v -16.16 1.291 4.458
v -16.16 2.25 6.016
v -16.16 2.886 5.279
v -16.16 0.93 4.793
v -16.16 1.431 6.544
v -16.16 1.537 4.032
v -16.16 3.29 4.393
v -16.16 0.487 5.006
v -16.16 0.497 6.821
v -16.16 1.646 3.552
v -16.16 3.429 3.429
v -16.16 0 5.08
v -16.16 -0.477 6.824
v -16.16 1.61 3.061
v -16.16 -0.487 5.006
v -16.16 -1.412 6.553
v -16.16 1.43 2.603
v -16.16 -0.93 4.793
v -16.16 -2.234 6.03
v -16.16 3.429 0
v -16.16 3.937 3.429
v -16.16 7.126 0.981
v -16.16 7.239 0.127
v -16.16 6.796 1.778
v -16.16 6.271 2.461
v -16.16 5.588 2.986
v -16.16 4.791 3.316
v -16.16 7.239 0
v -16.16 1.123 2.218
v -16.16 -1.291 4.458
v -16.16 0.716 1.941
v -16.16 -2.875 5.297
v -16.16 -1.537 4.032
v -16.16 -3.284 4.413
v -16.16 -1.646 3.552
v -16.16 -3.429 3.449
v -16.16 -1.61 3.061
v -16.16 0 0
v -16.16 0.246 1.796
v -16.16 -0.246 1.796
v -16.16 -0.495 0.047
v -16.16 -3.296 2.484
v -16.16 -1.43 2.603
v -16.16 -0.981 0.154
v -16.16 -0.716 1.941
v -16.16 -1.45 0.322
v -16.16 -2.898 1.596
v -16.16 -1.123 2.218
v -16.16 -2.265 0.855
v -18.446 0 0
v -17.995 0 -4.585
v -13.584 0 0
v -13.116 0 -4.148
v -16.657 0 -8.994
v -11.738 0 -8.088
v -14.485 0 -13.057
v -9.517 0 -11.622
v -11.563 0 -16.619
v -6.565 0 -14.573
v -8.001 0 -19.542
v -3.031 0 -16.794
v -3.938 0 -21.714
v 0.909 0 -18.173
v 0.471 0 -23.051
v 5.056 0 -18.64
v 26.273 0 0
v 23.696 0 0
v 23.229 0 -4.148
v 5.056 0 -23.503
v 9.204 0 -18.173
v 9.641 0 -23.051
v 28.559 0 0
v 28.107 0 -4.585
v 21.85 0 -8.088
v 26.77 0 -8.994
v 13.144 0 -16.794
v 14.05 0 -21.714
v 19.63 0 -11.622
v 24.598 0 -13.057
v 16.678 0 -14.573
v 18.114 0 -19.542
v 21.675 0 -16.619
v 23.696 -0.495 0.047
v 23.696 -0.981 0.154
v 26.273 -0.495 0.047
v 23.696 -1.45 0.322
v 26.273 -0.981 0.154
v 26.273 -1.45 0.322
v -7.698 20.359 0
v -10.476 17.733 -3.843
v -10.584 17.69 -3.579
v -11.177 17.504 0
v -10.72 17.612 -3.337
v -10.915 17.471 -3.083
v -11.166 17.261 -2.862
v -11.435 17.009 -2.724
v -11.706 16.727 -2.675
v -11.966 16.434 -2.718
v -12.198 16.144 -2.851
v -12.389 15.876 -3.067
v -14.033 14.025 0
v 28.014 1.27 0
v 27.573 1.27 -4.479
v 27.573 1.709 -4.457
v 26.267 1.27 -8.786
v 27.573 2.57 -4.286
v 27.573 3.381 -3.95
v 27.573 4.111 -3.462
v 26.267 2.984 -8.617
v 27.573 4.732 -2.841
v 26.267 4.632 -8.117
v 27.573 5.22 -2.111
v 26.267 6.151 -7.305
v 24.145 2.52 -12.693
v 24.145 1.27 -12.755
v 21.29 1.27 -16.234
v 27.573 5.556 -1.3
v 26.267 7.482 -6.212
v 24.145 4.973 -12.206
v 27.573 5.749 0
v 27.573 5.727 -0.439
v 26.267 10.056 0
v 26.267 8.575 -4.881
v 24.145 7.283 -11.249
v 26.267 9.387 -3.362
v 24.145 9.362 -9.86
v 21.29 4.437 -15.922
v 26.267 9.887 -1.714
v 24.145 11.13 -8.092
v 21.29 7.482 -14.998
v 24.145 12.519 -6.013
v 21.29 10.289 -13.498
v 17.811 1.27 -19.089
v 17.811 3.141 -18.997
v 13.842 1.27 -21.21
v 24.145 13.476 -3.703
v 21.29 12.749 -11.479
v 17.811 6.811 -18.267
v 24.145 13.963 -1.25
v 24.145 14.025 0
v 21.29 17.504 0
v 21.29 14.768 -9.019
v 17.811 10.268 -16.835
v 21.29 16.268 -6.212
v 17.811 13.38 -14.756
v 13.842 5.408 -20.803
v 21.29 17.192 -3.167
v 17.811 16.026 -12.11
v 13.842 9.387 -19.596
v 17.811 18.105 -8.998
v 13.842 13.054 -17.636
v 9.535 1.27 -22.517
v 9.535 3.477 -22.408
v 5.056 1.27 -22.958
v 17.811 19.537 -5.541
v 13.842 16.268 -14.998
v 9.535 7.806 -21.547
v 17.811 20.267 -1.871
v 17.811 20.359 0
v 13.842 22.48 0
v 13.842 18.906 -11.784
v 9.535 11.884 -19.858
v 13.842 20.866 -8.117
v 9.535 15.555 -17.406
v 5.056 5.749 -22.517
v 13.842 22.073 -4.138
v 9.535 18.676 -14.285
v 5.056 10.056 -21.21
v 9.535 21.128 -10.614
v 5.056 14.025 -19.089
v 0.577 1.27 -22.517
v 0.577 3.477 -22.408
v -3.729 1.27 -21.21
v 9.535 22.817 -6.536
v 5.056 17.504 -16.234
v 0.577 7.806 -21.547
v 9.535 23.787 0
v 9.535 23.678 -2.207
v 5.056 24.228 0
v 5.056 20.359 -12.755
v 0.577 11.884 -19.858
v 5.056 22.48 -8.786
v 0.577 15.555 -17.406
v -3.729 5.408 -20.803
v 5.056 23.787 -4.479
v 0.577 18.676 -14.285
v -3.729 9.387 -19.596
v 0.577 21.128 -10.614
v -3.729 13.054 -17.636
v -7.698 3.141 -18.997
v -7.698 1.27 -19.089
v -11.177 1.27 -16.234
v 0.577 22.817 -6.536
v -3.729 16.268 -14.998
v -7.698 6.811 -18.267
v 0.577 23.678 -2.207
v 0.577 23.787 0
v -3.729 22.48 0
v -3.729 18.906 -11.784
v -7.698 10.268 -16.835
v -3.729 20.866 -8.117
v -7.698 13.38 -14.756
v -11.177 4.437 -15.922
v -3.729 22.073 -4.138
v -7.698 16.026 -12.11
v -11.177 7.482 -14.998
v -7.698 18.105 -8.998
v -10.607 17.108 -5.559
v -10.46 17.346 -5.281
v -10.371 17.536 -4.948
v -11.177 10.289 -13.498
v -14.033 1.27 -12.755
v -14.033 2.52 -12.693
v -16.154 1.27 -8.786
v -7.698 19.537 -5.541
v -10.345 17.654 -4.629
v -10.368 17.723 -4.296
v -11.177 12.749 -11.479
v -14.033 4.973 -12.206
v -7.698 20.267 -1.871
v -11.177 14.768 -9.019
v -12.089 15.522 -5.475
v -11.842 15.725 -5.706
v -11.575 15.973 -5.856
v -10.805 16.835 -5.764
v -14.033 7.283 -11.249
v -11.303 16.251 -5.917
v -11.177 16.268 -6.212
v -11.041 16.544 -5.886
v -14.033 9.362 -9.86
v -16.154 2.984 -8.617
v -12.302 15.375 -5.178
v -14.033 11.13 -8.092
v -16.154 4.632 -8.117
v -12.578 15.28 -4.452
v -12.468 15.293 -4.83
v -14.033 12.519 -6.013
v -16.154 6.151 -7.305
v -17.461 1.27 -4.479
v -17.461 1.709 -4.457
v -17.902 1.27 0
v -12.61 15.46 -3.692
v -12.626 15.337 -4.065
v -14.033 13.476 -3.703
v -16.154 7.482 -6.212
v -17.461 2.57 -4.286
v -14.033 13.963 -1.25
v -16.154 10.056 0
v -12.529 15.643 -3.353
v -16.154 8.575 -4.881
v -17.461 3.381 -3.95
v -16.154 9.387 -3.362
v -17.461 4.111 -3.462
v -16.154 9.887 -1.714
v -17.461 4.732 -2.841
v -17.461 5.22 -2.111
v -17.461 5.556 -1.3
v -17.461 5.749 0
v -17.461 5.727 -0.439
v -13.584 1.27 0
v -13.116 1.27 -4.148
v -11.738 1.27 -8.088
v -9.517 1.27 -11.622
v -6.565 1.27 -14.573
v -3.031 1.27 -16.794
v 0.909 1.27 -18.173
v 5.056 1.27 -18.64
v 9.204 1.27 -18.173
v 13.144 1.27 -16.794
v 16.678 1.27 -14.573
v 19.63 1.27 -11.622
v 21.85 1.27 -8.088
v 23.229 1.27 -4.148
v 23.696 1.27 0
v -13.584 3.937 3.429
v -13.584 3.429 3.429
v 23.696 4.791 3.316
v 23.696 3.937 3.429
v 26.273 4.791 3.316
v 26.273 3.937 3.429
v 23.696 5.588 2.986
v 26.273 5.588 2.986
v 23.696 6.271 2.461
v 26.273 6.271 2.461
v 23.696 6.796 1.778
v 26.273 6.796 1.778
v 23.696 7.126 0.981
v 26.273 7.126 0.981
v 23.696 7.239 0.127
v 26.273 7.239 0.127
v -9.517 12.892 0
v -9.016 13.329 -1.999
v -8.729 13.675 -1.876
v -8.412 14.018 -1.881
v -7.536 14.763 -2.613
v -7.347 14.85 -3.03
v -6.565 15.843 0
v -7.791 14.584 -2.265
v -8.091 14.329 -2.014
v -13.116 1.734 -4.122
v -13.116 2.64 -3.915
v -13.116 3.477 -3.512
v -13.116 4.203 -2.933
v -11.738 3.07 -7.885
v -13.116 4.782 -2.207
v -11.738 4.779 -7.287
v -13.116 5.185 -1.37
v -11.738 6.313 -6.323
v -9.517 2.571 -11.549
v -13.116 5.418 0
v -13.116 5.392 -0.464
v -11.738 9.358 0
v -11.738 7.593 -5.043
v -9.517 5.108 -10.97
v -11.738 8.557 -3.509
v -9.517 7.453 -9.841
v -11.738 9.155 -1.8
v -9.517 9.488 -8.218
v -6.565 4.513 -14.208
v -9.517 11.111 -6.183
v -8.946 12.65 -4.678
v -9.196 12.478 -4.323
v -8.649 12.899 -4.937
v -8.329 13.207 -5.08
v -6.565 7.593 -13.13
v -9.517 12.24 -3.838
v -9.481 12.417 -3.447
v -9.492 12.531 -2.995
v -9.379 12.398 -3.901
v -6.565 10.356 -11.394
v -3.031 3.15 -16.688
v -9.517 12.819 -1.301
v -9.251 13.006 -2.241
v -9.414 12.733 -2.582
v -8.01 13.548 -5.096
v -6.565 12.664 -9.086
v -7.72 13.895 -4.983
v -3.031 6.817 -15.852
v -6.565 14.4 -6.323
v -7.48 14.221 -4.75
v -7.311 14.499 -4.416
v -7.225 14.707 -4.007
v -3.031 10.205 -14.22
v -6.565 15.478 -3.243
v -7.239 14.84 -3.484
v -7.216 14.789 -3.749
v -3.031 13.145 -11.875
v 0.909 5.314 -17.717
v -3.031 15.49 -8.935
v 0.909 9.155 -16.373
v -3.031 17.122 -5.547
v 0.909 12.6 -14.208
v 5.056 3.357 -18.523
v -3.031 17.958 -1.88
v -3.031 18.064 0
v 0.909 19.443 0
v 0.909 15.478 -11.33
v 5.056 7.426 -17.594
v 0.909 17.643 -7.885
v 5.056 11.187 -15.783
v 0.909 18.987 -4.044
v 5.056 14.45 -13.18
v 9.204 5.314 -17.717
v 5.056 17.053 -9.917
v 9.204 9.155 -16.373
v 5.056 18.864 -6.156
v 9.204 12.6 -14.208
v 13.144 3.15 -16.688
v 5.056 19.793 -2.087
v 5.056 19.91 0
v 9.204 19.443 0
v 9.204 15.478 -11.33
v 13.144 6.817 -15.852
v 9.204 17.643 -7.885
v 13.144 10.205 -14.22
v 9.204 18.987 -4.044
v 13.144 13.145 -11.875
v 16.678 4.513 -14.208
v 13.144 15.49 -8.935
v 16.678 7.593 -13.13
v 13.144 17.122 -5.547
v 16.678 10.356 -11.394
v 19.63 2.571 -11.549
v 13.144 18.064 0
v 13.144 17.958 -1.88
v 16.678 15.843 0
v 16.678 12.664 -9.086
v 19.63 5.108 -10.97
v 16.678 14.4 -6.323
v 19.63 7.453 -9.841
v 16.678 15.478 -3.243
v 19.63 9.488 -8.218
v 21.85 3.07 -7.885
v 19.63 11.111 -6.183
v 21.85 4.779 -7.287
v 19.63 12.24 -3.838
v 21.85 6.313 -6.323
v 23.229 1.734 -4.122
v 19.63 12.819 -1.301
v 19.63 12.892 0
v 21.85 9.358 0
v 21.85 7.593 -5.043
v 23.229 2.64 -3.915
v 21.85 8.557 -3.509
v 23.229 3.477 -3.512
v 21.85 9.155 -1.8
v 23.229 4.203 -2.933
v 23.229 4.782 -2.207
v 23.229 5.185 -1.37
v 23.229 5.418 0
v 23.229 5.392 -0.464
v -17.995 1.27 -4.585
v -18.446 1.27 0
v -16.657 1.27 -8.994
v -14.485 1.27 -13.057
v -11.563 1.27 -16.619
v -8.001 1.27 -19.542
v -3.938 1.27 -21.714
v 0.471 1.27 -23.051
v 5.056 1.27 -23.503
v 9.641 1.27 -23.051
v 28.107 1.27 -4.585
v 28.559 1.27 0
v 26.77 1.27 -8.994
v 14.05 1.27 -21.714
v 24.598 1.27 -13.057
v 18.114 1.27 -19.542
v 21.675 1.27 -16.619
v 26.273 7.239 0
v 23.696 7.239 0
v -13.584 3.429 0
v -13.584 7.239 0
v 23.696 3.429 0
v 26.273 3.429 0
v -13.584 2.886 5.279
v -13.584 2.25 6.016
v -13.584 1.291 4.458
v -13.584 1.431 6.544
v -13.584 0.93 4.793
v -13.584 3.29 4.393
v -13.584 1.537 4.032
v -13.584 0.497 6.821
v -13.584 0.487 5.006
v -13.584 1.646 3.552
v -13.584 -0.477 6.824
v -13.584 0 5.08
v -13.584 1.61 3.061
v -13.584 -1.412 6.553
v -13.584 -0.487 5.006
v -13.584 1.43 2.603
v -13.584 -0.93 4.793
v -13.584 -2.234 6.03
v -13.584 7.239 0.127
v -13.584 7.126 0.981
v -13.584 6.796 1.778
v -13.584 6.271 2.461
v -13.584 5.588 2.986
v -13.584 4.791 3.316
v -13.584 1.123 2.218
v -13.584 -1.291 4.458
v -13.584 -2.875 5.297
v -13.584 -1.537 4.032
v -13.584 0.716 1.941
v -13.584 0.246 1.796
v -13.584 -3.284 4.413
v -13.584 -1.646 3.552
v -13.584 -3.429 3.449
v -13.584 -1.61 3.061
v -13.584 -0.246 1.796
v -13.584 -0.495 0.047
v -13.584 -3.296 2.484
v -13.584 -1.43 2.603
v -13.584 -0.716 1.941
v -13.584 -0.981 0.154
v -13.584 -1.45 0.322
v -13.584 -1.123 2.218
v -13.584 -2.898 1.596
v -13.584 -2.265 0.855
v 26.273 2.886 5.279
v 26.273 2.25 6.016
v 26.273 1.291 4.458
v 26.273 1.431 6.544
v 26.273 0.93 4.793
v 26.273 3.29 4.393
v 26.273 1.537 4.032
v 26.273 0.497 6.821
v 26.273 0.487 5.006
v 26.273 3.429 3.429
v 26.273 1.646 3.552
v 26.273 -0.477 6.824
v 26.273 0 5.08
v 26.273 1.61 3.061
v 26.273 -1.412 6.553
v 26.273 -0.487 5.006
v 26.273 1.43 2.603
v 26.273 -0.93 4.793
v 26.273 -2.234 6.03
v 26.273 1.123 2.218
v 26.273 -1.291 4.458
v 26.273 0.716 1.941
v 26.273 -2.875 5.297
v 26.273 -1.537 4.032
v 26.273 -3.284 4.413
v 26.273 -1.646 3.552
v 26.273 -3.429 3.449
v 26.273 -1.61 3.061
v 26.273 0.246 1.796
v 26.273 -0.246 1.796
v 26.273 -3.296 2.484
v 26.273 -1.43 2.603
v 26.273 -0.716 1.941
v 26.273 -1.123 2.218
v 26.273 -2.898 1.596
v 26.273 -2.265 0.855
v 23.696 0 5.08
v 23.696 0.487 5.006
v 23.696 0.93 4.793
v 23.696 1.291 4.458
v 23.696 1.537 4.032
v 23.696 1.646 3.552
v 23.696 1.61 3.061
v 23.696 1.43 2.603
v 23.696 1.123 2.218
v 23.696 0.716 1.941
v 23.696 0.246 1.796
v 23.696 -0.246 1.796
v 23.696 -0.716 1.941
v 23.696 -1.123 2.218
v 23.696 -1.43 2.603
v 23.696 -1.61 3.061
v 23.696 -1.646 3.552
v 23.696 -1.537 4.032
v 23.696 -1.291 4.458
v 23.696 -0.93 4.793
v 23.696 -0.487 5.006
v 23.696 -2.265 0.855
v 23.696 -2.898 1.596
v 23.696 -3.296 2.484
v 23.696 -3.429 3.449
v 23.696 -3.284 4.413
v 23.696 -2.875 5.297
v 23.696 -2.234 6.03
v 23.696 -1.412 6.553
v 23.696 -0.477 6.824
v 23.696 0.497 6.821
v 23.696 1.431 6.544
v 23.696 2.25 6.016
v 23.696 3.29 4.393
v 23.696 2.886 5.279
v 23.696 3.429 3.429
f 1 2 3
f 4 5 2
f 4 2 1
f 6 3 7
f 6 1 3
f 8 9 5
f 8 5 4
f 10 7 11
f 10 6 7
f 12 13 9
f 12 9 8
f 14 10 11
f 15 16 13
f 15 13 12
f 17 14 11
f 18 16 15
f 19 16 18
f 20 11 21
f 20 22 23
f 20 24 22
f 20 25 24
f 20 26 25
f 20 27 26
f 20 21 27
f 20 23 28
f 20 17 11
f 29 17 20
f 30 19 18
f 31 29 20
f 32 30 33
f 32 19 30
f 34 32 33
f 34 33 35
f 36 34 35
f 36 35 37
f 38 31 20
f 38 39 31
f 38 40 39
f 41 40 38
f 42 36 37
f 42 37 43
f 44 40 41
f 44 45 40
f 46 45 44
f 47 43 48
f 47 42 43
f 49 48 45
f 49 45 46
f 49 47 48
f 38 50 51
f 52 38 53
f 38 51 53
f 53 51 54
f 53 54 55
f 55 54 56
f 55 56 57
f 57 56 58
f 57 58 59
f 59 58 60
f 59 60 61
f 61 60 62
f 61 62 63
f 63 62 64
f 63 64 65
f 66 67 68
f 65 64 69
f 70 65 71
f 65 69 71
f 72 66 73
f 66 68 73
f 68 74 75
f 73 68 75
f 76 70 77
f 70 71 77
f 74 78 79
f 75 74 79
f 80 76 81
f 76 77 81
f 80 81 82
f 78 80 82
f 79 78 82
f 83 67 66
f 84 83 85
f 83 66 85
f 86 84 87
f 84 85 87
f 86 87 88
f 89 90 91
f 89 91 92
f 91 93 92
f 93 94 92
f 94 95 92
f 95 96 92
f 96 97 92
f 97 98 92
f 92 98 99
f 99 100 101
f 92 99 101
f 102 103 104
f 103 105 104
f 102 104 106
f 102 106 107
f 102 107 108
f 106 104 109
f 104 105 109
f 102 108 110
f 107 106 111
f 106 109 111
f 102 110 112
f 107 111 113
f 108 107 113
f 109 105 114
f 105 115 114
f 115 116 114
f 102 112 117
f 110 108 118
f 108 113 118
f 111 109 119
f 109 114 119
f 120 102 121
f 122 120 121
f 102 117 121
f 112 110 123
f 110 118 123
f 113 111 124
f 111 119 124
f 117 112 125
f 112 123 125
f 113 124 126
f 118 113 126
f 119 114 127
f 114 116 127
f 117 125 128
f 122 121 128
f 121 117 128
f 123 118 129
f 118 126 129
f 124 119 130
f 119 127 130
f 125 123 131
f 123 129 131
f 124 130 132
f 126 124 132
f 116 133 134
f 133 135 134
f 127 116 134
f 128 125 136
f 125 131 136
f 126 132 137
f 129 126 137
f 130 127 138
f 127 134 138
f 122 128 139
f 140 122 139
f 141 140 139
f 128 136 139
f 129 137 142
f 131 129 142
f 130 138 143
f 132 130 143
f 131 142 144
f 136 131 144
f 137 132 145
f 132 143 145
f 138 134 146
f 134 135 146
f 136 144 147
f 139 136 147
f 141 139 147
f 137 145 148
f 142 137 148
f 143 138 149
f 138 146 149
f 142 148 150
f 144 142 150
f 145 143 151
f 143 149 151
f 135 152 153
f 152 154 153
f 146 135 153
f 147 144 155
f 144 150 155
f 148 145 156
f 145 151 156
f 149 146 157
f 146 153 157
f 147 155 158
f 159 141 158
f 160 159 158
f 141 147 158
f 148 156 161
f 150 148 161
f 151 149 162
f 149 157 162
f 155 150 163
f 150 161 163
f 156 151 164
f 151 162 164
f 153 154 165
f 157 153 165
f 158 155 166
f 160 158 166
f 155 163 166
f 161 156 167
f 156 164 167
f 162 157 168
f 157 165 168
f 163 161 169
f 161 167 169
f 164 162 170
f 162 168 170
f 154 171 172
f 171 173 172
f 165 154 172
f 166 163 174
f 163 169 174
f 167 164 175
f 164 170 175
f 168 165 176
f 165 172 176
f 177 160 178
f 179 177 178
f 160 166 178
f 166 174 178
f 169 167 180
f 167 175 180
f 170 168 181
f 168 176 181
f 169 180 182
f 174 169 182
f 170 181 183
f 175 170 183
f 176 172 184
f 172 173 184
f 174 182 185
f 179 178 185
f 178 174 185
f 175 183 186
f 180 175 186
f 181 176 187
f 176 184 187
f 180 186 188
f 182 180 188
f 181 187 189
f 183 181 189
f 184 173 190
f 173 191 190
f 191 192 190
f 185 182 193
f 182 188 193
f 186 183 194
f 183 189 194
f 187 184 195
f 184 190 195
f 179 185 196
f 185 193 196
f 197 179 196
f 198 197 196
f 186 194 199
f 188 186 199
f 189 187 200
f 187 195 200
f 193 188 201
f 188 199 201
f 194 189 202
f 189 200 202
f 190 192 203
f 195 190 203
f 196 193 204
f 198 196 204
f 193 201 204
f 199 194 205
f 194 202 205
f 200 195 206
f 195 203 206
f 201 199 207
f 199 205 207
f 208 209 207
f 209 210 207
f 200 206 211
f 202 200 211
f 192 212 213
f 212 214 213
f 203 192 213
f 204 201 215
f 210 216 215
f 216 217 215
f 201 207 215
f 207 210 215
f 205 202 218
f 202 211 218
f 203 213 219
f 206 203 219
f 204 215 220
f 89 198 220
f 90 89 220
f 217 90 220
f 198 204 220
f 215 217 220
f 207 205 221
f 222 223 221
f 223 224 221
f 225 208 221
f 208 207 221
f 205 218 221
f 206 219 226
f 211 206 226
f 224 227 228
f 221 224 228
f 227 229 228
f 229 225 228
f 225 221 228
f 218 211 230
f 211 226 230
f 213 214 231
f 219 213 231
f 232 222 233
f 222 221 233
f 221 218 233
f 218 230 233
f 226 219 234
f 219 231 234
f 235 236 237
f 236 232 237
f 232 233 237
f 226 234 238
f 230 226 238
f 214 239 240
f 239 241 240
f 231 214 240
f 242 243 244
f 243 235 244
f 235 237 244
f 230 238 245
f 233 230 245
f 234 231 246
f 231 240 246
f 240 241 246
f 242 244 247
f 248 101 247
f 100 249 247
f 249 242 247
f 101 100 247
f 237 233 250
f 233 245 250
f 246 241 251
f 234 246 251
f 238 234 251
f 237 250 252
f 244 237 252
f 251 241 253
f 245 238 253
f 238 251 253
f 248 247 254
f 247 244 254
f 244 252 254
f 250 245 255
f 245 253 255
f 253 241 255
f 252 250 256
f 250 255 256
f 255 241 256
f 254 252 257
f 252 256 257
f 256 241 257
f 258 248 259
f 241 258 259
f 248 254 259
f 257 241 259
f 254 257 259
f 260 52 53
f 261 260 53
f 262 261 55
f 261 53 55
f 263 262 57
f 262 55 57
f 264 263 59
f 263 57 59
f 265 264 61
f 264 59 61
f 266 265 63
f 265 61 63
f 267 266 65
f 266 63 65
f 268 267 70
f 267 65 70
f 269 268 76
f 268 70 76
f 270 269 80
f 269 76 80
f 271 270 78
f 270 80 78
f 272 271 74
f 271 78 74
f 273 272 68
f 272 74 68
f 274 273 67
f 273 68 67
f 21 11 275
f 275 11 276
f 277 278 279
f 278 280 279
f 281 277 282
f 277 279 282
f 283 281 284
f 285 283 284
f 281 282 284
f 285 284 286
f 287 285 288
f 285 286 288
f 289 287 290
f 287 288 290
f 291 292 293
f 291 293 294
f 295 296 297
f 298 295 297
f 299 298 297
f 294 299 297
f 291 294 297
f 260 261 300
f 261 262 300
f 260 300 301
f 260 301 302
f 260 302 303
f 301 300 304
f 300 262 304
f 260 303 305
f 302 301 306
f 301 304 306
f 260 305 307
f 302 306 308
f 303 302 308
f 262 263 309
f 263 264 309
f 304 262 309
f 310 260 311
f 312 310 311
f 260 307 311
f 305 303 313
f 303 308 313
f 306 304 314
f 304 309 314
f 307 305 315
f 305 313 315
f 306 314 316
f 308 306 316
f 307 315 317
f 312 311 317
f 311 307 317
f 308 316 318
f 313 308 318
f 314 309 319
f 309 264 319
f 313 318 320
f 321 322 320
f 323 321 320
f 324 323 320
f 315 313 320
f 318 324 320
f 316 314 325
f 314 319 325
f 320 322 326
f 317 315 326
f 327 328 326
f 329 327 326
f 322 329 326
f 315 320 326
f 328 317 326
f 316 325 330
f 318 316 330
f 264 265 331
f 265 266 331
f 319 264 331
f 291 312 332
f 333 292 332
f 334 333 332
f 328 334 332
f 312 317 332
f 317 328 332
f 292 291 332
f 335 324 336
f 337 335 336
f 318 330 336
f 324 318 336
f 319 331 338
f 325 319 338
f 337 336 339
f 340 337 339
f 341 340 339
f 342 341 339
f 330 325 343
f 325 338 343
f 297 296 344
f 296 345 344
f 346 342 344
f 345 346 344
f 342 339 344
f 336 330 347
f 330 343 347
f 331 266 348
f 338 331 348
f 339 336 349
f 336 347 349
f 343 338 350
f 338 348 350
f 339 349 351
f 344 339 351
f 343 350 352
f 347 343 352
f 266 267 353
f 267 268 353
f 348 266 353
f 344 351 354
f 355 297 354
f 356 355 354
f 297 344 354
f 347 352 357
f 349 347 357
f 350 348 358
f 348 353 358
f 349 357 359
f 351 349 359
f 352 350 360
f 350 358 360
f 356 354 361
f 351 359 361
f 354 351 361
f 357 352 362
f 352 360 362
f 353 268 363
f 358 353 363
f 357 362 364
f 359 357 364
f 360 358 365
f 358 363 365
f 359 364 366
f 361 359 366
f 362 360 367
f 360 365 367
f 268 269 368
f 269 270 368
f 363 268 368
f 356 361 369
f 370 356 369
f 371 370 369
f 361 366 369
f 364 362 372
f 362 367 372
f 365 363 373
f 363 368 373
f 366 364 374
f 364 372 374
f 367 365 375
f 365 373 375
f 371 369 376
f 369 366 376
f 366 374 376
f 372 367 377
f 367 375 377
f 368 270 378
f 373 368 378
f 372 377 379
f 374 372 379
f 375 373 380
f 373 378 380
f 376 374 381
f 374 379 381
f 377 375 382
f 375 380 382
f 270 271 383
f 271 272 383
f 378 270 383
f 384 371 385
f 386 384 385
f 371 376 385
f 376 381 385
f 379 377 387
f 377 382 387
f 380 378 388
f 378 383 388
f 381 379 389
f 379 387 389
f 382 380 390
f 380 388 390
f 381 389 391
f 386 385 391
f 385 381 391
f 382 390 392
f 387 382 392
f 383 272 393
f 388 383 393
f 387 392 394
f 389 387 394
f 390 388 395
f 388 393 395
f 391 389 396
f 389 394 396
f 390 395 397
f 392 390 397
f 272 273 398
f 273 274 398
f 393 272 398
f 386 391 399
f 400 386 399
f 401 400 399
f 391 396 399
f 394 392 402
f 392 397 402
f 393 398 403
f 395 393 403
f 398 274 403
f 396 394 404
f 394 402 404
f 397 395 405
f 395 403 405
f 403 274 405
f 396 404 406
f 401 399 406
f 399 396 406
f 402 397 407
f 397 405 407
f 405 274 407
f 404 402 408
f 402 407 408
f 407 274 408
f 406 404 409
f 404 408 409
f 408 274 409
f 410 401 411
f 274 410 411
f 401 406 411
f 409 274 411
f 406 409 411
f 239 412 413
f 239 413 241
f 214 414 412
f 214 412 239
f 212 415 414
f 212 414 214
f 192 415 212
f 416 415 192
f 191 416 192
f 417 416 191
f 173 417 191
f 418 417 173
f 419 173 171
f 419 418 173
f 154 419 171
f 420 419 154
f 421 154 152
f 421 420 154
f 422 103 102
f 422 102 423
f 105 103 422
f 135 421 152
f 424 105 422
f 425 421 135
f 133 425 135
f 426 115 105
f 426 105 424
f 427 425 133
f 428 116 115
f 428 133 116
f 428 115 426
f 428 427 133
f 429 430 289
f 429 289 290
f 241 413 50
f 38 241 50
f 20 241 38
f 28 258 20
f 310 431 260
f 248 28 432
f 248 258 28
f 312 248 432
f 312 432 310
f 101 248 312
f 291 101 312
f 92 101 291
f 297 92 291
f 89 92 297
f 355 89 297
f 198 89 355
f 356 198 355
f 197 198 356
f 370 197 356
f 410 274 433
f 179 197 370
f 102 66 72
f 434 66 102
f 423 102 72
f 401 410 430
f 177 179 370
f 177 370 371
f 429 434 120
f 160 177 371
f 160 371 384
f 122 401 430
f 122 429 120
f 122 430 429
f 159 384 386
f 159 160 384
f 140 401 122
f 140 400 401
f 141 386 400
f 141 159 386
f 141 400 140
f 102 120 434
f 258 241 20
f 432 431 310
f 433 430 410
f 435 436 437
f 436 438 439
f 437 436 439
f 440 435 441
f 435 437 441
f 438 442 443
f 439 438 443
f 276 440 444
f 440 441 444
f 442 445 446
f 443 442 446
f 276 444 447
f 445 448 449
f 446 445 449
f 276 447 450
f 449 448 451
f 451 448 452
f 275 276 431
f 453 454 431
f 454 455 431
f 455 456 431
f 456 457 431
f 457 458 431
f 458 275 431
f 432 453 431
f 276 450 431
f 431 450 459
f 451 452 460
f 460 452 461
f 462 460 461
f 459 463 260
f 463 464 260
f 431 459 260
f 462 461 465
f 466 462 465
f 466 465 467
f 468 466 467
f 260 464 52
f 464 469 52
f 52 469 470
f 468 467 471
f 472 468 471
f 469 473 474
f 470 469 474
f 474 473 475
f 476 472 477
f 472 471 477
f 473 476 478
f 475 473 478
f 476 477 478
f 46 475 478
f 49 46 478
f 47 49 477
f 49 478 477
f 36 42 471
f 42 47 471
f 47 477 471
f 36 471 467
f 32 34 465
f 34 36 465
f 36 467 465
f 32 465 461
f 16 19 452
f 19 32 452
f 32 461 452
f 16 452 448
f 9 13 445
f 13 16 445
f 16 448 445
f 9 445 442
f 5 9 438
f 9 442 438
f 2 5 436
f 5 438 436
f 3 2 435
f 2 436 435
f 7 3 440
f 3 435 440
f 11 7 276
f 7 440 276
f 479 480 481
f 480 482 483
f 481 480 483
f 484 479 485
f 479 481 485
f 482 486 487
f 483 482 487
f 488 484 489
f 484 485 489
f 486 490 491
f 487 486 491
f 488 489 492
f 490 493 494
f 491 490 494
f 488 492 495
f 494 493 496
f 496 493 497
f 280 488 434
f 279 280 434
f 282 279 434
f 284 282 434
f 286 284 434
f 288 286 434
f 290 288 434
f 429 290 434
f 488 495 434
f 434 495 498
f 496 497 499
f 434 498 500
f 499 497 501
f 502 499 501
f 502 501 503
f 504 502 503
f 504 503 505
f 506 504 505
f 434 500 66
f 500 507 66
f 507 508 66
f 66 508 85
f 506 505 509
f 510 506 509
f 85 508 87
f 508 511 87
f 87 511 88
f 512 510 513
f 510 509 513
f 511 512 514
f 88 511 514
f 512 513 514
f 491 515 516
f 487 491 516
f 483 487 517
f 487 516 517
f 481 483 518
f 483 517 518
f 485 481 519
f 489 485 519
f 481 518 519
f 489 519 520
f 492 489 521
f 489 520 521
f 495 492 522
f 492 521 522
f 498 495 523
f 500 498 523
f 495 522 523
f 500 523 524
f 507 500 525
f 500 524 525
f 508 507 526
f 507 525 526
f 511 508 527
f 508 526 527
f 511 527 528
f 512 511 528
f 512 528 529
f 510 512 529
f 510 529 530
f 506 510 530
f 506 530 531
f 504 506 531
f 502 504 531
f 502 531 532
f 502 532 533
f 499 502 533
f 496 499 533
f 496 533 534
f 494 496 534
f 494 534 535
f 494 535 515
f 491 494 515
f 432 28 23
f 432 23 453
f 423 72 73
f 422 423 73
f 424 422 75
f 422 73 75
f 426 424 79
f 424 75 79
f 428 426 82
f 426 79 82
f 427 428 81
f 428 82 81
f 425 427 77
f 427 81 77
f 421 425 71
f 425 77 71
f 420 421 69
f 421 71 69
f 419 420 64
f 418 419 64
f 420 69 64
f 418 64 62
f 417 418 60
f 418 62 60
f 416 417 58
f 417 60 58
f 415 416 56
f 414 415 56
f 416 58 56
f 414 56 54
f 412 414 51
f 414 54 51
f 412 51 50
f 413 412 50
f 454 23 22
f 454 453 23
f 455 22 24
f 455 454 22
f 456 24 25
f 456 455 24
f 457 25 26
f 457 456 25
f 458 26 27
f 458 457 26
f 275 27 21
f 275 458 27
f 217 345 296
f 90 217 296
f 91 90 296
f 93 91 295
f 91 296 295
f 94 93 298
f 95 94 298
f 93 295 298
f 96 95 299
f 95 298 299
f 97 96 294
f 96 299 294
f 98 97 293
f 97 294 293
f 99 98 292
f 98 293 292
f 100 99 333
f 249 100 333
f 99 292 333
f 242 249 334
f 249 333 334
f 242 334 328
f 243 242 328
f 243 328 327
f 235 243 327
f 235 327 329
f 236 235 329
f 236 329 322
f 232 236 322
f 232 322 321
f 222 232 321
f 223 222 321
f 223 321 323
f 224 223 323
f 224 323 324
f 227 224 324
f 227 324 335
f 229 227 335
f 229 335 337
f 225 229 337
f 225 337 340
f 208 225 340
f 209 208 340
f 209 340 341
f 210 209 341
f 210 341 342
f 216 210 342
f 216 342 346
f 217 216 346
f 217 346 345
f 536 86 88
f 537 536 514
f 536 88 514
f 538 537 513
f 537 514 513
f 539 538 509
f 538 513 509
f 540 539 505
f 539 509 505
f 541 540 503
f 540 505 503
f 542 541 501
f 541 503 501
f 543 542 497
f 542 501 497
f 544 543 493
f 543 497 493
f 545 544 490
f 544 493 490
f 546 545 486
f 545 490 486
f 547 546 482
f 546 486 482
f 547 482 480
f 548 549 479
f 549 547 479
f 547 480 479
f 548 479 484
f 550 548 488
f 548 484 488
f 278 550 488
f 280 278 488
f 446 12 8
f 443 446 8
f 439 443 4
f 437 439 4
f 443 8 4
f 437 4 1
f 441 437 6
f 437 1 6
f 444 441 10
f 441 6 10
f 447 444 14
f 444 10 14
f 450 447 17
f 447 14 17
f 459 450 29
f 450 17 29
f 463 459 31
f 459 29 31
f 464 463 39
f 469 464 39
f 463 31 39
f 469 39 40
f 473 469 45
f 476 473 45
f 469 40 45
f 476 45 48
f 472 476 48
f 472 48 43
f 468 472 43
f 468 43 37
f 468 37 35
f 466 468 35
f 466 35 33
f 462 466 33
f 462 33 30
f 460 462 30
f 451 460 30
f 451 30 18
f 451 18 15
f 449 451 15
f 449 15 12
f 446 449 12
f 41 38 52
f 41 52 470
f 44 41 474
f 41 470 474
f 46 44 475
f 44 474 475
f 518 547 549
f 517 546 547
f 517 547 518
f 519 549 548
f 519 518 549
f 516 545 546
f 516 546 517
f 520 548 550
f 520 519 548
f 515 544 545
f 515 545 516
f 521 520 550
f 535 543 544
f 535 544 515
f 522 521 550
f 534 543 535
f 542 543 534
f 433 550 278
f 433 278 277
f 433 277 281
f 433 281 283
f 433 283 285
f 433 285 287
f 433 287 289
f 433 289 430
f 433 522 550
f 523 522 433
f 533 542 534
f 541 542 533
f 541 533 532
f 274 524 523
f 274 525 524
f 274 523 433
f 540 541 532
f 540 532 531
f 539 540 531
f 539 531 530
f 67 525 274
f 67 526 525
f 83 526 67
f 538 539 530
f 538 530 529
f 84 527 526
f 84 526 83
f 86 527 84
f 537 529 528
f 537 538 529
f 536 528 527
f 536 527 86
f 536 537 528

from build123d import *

# Parameters (mm, degrees)
BOSS_EXTRUDE1_DEPTH              = 1.27
REVOLVE3_ANGLE                   = 90
SKETCH6_W                        = 4.862612613
SKETCH6_H                        = 1.27
BOSS_EXTRUDE3_DEPTH              = 7.935530078
BOSS_EXTRUDE4_DEPTH              = 3.81
BOSS_EXTRUDE4_DEPTH_BACK         = 6.35
SKETCH10_W                       = 4.862612613
SKETCH10_H                       = 7.935530078
FILLET7_R                        = 5.08
FILLET10_R                       = 5.08
SKETCH13_R                       = 1.651
CUT_EXTRUDE2_DEPTH               = 55.372
SKETCH14_W                       = 2.286
SKETCH14_H                       = 11.368095807
CUT_EXTRUDE3_DEPTH               = 55.372
FILLET15_RADIUS                  = 3.967765039
FILLET15_LENGTH                  = 2.576612613
FILLET16_RADIUS                  = 3.967765039
FILLET16_LENGTH                  = 2.576612613
CUT_EXTRUDE4_DEPTH               = 55.372
CUT_EXTRUDE7_DEPTH               = 55.88
SKETCH19_W                       = 2.576612613
SKETCH19_H                       = 3.428576371
BOSS_EXTRUDE5_DEPTH              = 3.81
FILLET17_R                       = 3.302
FILLET18_R                       = 3.302
F_96_0_0063_DIAMETER_HOLE2_D     = 3.302
F_96_0_0063_DIAMETER_HOLE2_DEPTH = 25.4
F_96_0_0063_DIAMETER_HOLE2_TIP   = 0.992020882


with BuildPart() as part:
    # Sketch1 → Boss-Extrude1 (new body)
    with BuildSketch(Plane(origin=(0, 0, 0), x_dir=(1, 0, 0), z_dir=(0, 1, 0))):
        with BuildLine():
            Line((-18.44626818, 0), (-13.583655567, 0))
            ThreePointArc((-13.583655567, 0), (5.056359448, 18.640015015), (23.696374463, 0))
            Line((23.696374463, 0), (28.558987076, 0))
            ThreePointArc((28.558987076, 0), (5.056359448, 23.502627628), (-18.44626818, 0))
        make_face()
    extrude(amount=BOSS_EXTRUDE1_DEPTH)

    # Sketch4 → Revolve3 (revolve)
    with BuildSketch(Plane(origin=(0, 1.27, 0), x_dir=(1, 0, 0), z_dir=(0, 1, 0))):
        with BuildLine():
            Line((23.696374463, 0), (28.014374463, 0))
            ThreePointArc((28.014374463, 0), (5.056359448, 22.958015015), (-17.901655567, 0))
            Line((-17.901655567, 0), (-13.583655567, 0))
            ThreePointArc((-13.583655567, 0), (5.056359448, 18.640015015), (23.696374463, 0))
        make_face()
    revolve(axis=Axis((-17.901655567, 1.27, 0), (1, 0, 0)), revolution_arc=REVOLVE3_ANGLE)

    # Sketch6 → Boss-Extrude3 (add)
    with BuildSketch(Plane.XY):
        with Locations((-16.014961873, 0.635)):
            Rectangle(SKETCH6_W, SKETCH6_H)
        with Locations((26.12768077, 0.635)):
            Rectangle(SKETCH6_W, SKETCH6_H)
    extrude(amount=BOSS_EXTRUDE3_DEPTH)

    # Sketch10 → Boss-Extrude4 (add, two sides: drawn at the far end of the back side and taken through both)
    with BuildSketch(Plane(origin=(0, 1.27, 0), x_dir=(1, 0, 0), z_dir=(0, 1, 0)).offset(-BOSS_EXTRUDE4_DEPTH_BACK)):
        with Locations((-16.014961873, -3.967765039)):
            Rectangle(SKETCH10_W, SKETCH10_H)
        with Locations((26.12768077, -3.967765039)):
            Rectangle(SKETCH10_W, SKETCH10_H)
    extrude(amount=BOSS_EXTRUDE4_DEPTH + BOSS_EXTRUDE4_DEPTH_BACK)

    # Fillet7
    fillet7_edges = [part.edges().sort_by_distance(p)[0] for p in [
        (-16.014961873, 5.08, 7.935530078),
    ]]
    fillet(fillet7_edges, radius=FILLET7_R)

    # Fillet10
    fillet10_edges = [part.edges().sort_by_distance(p)[0] for p in [
        (26.127680769, 5.08, 7.935530078),
    ]]
    fillet(fillet10_edges, radius=FILLET10_R)

    # Sketch13 → Cut-Extrude2 (cut)
    with BuildSketch(Plane.ZY.offset(18.44626818)):
        with Locations((3.428576371, 0)):
            Circle(SKETCH13_R)
    extrude(amount=-CUT_EXTRUDE2_DEPTH, mode=Mode.SUBTRACT)

    # Sketch14 → Cut-Extrude3 (cut)
    with BuildSketch(Plane(origin=(0, 5.08, 0), x_dir=(1, 0, 0), z_dir=(0, 1, 0))):
        with Locations((27.415987076, -5.684047904)):
            Rectangle(SKETCH14_W, SKETCH14_H)
        with Locations((-17.30326818, -5.684047904)):
            Rectangle(SKETCH14_W, SKETCH14_H)
    extrude(amount=-CUT_EXTRUDE3_DEPTH, mode=Mode.SUBTRACT)

    # Fillet15: full round fillet: the end face becomes a half cylinder, R = half its width
    fillet15_face = Plane((24.984680769, -5.08, 3.967765039), x_dir=(1, 0, 0), z_dir=(0, -1, 0))  # on the end face: x along it, z out of the body
    fillet15_slab = fillet15_face.offset(-FILLET15_RADIUS / 2) * Box(FILLET15_LENGTH, 2 * FILLET15_RADIUS, FILLET15_RADIUS, mode=Mode.PRIVATE)  # the body's end, R deep
    fillet15_round = Plane((24.984680769, -1.112234961, 3.967765039), x_dir=(0, -1, 0), z_dir=(1, 0, 0)) * Cylinder(FILLET15_RADIUS, FILLET15_LENGTH, mode=Mode.PRIVATE)  # its axis R under the face
    add(fillet15_slab - fillet15_round, mode=Mode.SUBTRACT)

    # Fillet16: full round fillet: the end face becomes a half cylinder, R = half its width
    fillet16_face = Plane((-14.871961873, -5.08, 3.967765039), x_dir=(-1, 0, 0), z_dir=(0, -1, 0))  # on the end face: x along it, z out of the body
    fillet16_slab = fillet16_face.offset(-FILLET16_RADIUS / 2) * Box(FILLET16_LENGTH, 2 * FILLET16_RADIUS, FILLET16_RADIUS, mode=Mode.PRIVATE)  # the body's end, R deep
    fillet16_round = Plane((-14.871961873, -1.112234961, 3.967765039), x_dir=(0, -1, 0), z_dir=(-1, 0, 0)) * Cylinder(FILLET16_RADIUS, FILLET16_LENGTH, mode=Mode.PRIVATE)  # its axis R under the face
    add(fillet16_slab - fillet16_round, mode=Mode.SUBTRACT)

    # Sketch16 → Cut-Extrude4 (cut)
    with BuildSketch(Plane(origin=(26.272987076, 0, 0), x_dir=(0, 0, -1), z_dir=(1, 0, 0))):
        with BuildLine():
            ThreePointArc((0, 0), (-3.716578938, -3.862364093), (-7.935530078, -0.55611748))
            ThreePointArc((-7.935530078, -0.55611748), (-3.630565744, -5.089731167), (0, 0))
        make_face()
    extrude(amount=-CUT_EXTRUDE4_DEPTH, mode=Mode.SUBTRACT)

    # Sketch18 → Cut-Extrude7 (cut)
    with BuildSketch(Plane(origin=(26.272987076, 0, 0), x_dir=(0, 0, -1), z_dir=(1, 0, 0))):
        with BuildLine():
            Line((-3.428576371, 3.428576371), (0, 3.428576371))
            Line((0, 3.428576371), (0, 5.467356317))
            Line((0, 5.467356317), (-9.031573881, 5.467356317))
            Line((-9.031573881, 5.467356317), (-9.031573881, -4.486785293))
            Line((-9.031573881, -4.486785293), (0, -4.486785293))
            Line((0, -4.486785293), (0, 0))
            ThreePointArc((0, 0), (-5.852945973, -2.424369602), (-3.428576371, 3.428576371))
        make_face()
    extrude(amount=-CUT_EXTRUDE7_DEPTH, mode=Mode.SUBTRACT)

    # Sketch19 → Boss-Extrude5 (add)
    with BuildSketch(Plane(origin=(0, 3.428576371, 0), x_dir=(1, 0, 0), z_dir=(0, 1, 0))):
        with Locations((24.98468077, -1.714288186)):
            Rectangle(SKETCH19_W, SKETCH19_H)
        with Locations((-14.871961874, -1.714288186)):
            Rectangle(SKETCH19_W, SKETCH19_H)
    extrude(amount=BOSS_EXTRUDE5_DEPTH)

    # Fillet17
    fillet17_edges = [part.edges().sort_by_distance(p)[0] for p in [
        (24.984680769, 7.238576371, 3.428576371),
    ]]
    fillet(fillet17_edges, radius=FILLET17_R)

    # Fillet18
    fillet18_edges = [part.edges().sort_by_distance(p)[0] for p in [
        (-14.871961873, 7.238576371, 3.428576371),
    ]]
    fillet(fillet18_edges, radius=FILLET18_R)

    # #96 (0.0063) Diameter Hole2
    with Locations(Plane(origin=(-11.529605698, 16.548146571, -4.307487778), x_dir=(-0.677514134429, -0.735509753605, 0), z_dir=(-0.722447700093, 0.665482035826, -0.187624573613))):
        with Locations((0, 0)):
            Hole(F_96_0_0063_DIAMETER_HOLE2_D / 2, depth=F_96_0_0063_DIAMETER_HOLE2_DEPTH)
            with Locations((0, 0, -(F_96_0_0063_DIAMETER_HOLE2_DEPTH + F_96_0_0063_DIAMETER_HOLE2_TIP / 2))):  # 118° drill point
                Cone(0, F_96_0_0063_DIAMETER_HOLE2_D / 2, F_96_0_0063_DIAMETER_HOLE2_TIP, mode=Mode.SUBTRACT)


solid = part.part
